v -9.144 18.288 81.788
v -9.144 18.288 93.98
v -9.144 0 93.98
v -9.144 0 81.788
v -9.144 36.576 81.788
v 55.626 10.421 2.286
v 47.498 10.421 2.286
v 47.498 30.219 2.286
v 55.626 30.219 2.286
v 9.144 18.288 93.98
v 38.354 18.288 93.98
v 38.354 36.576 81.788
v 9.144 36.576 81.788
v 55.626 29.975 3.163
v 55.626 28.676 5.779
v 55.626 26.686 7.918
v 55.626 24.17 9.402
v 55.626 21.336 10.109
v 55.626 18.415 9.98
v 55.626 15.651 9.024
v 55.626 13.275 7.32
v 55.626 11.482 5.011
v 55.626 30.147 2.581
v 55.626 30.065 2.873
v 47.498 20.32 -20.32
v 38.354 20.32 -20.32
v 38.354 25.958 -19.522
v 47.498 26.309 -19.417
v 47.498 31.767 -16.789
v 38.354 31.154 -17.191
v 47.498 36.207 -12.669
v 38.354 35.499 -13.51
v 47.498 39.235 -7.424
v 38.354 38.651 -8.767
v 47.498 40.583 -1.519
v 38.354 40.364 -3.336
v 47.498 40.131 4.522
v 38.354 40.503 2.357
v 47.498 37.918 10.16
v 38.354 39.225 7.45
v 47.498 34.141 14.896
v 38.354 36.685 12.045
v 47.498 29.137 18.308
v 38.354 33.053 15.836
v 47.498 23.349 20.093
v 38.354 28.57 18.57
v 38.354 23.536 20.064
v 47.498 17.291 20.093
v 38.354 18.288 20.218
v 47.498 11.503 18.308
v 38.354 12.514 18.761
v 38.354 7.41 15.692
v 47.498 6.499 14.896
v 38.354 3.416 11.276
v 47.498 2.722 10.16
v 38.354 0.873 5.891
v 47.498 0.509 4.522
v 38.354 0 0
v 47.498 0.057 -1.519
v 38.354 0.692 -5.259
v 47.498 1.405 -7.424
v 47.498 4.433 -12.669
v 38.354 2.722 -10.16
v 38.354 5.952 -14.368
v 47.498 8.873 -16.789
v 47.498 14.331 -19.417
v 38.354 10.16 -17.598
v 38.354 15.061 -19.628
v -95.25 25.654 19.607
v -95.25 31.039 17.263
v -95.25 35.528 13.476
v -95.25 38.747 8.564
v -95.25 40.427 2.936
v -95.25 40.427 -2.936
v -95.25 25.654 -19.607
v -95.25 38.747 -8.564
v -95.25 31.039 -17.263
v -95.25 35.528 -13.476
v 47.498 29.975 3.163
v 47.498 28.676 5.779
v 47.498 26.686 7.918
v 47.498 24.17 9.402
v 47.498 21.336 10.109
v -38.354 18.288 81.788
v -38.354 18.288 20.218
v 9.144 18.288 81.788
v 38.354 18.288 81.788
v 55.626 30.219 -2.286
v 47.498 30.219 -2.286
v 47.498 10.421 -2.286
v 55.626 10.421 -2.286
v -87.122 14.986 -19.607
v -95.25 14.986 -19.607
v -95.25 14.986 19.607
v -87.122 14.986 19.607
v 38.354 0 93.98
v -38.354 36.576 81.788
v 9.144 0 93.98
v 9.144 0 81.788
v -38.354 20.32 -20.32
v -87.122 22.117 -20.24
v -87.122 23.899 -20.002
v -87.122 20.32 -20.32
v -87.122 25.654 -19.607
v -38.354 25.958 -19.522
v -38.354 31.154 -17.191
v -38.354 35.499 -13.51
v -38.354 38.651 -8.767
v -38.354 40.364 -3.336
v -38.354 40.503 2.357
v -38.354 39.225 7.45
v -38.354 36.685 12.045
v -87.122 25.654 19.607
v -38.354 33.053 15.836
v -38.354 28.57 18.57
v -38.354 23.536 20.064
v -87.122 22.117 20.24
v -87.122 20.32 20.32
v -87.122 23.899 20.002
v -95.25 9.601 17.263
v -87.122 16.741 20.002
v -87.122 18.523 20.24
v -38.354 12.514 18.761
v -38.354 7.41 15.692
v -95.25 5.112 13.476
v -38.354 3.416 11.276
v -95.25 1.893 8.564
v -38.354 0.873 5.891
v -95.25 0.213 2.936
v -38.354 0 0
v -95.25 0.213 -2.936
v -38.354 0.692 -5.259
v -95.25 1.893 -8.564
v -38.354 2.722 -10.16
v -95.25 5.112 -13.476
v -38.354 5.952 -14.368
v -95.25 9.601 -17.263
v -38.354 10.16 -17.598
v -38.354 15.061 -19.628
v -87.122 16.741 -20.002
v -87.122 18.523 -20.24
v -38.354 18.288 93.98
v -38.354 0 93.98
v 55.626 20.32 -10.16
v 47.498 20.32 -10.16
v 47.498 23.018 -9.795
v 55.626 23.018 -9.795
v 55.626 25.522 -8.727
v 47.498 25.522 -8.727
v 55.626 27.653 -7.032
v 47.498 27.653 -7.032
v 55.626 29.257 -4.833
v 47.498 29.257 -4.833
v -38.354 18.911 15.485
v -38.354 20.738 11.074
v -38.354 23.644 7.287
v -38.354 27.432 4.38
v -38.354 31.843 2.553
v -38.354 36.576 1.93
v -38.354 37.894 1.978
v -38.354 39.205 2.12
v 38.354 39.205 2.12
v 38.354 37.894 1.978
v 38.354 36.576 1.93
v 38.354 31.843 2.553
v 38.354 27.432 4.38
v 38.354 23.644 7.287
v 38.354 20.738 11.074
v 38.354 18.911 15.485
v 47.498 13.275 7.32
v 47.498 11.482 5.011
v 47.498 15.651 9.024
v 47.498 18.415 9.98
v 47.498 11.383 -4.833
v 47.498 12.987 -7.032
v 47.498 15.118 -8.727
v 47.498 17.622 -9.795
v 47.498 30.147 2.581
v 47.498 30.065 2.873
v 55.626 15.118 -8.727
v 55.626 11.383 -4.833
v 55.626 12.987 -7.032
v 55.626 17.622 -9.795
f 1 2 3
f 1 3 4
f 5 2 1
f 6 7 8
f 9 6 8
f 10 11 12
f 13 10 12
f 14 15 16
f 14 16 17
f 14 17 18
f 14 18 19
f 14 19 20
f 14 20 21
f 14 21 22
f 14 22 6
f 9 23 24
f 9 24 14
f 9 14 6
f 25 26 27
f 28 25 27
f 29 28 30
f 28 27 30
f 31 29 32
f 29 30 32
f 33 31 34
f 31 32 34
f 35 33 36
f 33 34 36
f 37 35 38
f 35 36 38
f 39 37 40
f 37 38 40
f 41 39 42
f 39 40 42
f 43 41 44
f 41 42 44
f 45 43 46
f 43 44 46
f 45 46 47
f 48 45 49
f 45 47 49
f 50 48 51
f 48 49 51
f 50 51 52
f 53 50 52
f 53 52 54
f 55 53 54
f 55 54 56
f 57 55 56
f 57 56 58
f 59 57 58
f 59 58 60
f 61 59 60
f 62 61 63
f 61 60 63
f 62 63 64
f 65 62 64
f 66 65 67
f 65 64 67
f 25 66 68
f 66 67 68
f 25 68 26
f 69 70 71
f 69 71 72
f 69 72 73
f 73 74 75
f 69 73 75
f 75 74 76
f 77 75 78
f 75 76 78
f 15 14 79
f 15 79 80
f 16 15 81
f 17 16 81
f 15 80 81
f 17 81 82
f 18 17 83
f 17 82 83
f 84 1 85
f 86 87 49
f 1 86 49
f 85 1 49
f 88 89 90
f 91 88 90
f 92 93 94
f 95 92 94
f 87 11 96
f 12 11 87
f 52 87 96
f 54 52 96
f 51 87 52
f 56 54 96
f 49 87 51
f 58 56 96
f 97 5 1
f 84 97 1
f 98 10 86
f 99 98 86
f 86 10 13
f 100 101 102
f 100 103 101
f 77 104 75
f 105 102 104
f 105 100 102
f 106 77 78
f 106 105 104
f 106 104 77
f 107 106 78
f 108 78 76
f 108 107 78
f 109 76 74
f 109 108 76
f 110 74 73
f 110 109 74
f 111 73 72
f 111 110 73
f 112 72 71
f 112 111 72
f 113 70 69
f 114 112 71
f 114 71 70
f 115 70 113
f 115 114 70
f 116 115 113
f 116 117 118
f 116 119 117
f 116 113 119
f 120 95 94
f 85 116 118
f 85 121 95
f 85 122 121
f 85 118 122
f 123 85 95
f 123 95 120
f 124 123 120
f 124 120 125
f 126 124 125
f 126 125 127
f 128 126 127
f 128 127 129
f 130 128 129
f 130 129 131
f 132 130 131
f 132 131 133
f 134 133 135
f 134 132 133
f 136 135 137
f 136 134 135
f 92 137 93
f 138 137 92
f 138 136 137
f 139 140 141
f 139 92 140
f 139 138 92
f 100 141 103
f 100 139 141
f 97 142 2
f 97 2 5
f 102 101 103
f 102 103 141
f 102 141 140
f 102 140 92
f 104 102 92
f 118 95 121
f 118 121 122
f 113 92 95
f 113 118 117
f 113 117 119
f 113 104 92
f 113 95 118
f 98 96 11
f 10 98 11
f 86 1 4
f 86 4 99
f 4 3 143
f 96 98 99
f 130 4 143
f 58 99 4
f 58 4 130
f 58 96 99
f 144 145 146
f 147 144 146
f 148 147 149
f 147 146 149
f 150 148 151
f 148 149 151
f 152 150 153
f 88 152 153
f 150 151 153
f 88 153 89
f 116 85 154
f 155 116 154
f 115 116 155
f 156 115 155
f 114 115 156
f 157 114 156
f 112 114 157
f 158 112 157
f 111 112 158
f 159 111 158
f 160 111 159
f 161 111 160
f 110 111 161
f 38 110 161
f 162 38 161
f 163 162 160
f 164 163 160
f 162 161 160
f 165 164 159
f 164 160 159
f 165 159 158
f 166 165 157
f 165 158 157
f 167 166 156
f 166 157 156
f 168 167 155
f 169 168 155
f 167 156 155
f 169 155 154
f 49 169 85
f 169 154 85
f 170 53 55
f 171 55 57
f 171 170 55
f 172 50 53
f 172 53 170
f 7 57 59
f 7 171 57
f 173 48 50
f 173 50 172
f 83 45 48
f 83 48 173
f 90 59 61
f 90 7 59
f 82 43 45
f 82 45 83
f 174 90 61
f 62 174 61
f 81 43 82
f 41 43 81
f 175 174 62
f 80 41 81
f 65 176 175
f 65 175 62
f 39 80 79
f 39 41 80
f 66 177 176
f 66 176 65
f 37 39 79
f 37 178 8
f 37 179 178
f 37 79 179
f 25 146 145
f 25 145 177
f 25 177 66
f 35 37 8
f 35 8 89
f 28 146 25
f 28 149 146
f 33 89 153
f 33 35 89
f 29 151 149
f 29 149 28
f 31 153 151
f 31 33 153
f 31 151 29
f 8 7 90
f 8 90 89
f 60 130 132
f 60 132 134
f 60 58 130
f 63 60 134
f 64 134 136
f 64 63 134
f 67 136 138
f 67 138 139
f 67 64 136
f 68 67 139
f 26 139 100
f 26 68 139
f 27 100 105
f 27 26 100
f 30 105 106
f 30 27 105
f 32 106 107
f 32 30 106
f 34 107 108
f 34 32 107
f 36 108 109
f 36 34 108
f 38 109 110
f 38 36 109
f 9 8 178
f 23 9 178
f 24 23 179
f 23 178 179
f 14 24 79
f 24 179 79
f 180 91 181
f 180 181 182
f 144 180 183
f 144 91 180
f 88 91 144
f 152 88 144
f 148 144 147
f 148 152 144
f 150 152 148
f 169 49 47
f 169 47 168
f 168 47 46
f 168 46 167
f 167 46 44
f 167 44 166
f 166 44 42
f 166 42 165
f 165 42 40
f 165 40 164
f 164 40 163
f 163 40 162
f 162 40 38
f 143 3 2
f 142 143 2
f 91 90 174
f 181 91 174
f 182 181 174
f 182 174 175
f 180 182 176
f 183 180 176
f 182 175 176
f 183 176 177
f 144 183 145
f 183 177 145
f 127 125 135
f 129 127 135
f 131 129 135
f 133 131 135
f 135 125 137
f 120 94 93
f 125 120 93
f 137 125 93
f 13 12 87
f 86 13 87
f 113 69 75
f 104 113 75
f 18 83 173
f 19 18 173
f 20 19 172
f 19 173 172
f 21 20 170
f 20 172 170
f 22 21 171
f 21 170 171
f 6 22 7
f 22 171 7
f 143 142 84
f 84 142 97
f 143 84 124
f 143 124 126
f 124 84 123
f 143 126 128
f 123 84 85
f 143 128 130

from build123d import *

# Parameters (mm, degrees)
SKETCH2_W               = 81.788
SKETCH2_H               = 18.288
BOSS_EXTRUDE1_DEPTH     = 38.354
SKETCH3_R               = 20.32
BOSS_EXTRUDE2_DEPTH     = 9.144
BOSS_EXTRUDE3_START     = 9.144
BOSS_EXTRUDE3_DEPTH     = 8.128
BOSS_EXTRUDE4_START     = -76.708
SKETCH3_4_R             = 20.32
BOSS_EXTRUDE4_DEPTH     = 56.896
CUT_EXTRUDE1_DEPTH      = 8.128
SKETCH5_W               = 18.288
SKETCH5_H               = 12.192
CUT_EXTRUDE3_DEPTH      = 23.352
CUT_EXTRUDE3_DEPTH_BACK = 19.288


with BuildPart() as part:
    # Sketch2 → Boss-Extrude1 (new body, symmetric)
    with BuildSketch(Plane(origin=(0, 0, 0), x_dir=(0, 0, -1), z_dir=(1, 0, 0))):
        with Locations((-40.894, 9.144)):
            Rectangle(SKETCH2_W, SKETCH2_H)
        Polygon((-81.788, 36.576), (-81.788, 18.288), (-81.788, 0), (-93.98, 0), (-93.98, 18.288), align=None)
        with BuildLine():
            Line((0, 18.288), (0, 0))
            ThreePointArc((0, 0), (20.285688823, 21.500351201), (-2.356716256, 40.502871166))
            ThreePointArc((-2.356716256, 40.502871166), (-2.037100365, 38.550986103), (-1.930144722, 36.576))
            ThreePointArc((-1.930144722, 36.576), (-7.286575908, 23.644431186), (-20.218144722, 18.288))
            Line((-20.218144722, 18.288), (0, 18.288))
        make_face()
    extrude(amount=BOSS_EXTRUDE1_DEPTH, both=True)

    # Sketch3 → Boss-Extrude2 (add)
    with BuildSketch(Plane(origin=(38.354, 0, 0), x_dir=(0, 0, -1), z_dir=(1, 0, 0))):
        with Locations((0, 20.32)):
            Circle(SKETCH3_R)
    extrude(amount=BOSS_EXTRUDE2_DEPTH)

    # Sketch3<3> → Boss-Extrude3 (add)
    with BuildSketch(Plane(origin=(38.354, 0, 0), x_dir=(0, 0, -1), z_dir=(1, 0, 0)).offset(BOSS_EXTRUDE3_START)):
        with BuildLine():
            Line((-2.286, 10.420514963), (-2.286, 30.219485037))
            ThreePointArc((-2.286, 30.219485037), (-2.727219055, 30.107128089), (-3.162961291, 29.975116564))
            ThreePointArc((-3.162961291, 29.975116564), (-5.965678902, 25.116586312), (-10.109072361, 21.336))
            ThreePointArc((-10.109072361, 21.336), (-8.258111655, 14.401453566), (-2.286, 10.420514963))
        make_face()
        with BuildLine():
            ThreePointArc((10.16, 20.32), (7.951457728, 26.644548996), (2.286, 30.219485037))
            Line((2.286, 30.219485037), (2.286, 10.420514963))
            ThreePointArc((2.286, 10.420514963), (7.951457728, 13.995451004), (10.16, 20.32))
        make_face()
        with BuildLine():
            ThreePointArc((-10.109072361, 21.336), (-5.965678902, 25.116586312), (-3.162961291, 29.975116564))
            ThreePointArc((-3.162961291, 29.975116564), (-7.918036566, 26.686340938), (-10.109072361, 21.336))
        make_face()
    extrude(amount=BOSS_EXTRUDE3_DEPTH)

    # Sketch3<4> → Boss-Extrude4 (add)
    with BuildSketch(Plane(origin=(38.354, 0, 0), x_dir=(0, 0, -1), z_dir=(1, 0, 0)).offset(BOSS_EXTRUDE4_START)):
        with Locations((0, 20.32)):
            Circle(SKETCH3_4_R)
    extrude(amount=-BOSS_EXTRUDE4_DEPTH)

    # Sketch4 → Cut-Extrude1 (cut)
    with BuildSketch(Plane.ZY.offset(95.25)):
        with BuildLine():
            Line((19.607418086, 25.654), (-19.607418086, 25.654))
            ThreePointArc((-19.607418086, 25.654), (-20.32, 20.32), (-19.607418086, 14.986))
            Line((-19.607418086, 14.986), (19.607418086, 14.986))
            ThreePointArc((19.607418086, 14.986), (20.141066699, 17.629306363), (20.32, 20.32))
            ThreePointArc((20.32, 20.32), (20.141066699, 23.010693637), (19.607418086, 25.654))
        make_face()
    extrude(amount=-CUT_EXTRUDE1_DEPTH, mode=Mode.SUBTRACT)

    # Sketch5 → Cut-Extrude3 (cut, two sides)
    with BuildSketch(Plane(origin=(0, 18.288, 0), x_dir=(1, 0, 0), z_dir=(0, 1, 0))) as cut_extrude3_sk:
        with Locations((0, -87.884)):
            Rectangle(SKETCH5_W, SKETCH5_H)
    extrude(amount=CUT_EXTRUDE3_DEPTH, mode=Mode.SUBTRACT)
    extrude(cut_extrude3_sk.sketch, amount=-CUT_EXTRUDE3_DEPTH_BACK, mode=Mode.SUBTRACT)


solid = part.part
